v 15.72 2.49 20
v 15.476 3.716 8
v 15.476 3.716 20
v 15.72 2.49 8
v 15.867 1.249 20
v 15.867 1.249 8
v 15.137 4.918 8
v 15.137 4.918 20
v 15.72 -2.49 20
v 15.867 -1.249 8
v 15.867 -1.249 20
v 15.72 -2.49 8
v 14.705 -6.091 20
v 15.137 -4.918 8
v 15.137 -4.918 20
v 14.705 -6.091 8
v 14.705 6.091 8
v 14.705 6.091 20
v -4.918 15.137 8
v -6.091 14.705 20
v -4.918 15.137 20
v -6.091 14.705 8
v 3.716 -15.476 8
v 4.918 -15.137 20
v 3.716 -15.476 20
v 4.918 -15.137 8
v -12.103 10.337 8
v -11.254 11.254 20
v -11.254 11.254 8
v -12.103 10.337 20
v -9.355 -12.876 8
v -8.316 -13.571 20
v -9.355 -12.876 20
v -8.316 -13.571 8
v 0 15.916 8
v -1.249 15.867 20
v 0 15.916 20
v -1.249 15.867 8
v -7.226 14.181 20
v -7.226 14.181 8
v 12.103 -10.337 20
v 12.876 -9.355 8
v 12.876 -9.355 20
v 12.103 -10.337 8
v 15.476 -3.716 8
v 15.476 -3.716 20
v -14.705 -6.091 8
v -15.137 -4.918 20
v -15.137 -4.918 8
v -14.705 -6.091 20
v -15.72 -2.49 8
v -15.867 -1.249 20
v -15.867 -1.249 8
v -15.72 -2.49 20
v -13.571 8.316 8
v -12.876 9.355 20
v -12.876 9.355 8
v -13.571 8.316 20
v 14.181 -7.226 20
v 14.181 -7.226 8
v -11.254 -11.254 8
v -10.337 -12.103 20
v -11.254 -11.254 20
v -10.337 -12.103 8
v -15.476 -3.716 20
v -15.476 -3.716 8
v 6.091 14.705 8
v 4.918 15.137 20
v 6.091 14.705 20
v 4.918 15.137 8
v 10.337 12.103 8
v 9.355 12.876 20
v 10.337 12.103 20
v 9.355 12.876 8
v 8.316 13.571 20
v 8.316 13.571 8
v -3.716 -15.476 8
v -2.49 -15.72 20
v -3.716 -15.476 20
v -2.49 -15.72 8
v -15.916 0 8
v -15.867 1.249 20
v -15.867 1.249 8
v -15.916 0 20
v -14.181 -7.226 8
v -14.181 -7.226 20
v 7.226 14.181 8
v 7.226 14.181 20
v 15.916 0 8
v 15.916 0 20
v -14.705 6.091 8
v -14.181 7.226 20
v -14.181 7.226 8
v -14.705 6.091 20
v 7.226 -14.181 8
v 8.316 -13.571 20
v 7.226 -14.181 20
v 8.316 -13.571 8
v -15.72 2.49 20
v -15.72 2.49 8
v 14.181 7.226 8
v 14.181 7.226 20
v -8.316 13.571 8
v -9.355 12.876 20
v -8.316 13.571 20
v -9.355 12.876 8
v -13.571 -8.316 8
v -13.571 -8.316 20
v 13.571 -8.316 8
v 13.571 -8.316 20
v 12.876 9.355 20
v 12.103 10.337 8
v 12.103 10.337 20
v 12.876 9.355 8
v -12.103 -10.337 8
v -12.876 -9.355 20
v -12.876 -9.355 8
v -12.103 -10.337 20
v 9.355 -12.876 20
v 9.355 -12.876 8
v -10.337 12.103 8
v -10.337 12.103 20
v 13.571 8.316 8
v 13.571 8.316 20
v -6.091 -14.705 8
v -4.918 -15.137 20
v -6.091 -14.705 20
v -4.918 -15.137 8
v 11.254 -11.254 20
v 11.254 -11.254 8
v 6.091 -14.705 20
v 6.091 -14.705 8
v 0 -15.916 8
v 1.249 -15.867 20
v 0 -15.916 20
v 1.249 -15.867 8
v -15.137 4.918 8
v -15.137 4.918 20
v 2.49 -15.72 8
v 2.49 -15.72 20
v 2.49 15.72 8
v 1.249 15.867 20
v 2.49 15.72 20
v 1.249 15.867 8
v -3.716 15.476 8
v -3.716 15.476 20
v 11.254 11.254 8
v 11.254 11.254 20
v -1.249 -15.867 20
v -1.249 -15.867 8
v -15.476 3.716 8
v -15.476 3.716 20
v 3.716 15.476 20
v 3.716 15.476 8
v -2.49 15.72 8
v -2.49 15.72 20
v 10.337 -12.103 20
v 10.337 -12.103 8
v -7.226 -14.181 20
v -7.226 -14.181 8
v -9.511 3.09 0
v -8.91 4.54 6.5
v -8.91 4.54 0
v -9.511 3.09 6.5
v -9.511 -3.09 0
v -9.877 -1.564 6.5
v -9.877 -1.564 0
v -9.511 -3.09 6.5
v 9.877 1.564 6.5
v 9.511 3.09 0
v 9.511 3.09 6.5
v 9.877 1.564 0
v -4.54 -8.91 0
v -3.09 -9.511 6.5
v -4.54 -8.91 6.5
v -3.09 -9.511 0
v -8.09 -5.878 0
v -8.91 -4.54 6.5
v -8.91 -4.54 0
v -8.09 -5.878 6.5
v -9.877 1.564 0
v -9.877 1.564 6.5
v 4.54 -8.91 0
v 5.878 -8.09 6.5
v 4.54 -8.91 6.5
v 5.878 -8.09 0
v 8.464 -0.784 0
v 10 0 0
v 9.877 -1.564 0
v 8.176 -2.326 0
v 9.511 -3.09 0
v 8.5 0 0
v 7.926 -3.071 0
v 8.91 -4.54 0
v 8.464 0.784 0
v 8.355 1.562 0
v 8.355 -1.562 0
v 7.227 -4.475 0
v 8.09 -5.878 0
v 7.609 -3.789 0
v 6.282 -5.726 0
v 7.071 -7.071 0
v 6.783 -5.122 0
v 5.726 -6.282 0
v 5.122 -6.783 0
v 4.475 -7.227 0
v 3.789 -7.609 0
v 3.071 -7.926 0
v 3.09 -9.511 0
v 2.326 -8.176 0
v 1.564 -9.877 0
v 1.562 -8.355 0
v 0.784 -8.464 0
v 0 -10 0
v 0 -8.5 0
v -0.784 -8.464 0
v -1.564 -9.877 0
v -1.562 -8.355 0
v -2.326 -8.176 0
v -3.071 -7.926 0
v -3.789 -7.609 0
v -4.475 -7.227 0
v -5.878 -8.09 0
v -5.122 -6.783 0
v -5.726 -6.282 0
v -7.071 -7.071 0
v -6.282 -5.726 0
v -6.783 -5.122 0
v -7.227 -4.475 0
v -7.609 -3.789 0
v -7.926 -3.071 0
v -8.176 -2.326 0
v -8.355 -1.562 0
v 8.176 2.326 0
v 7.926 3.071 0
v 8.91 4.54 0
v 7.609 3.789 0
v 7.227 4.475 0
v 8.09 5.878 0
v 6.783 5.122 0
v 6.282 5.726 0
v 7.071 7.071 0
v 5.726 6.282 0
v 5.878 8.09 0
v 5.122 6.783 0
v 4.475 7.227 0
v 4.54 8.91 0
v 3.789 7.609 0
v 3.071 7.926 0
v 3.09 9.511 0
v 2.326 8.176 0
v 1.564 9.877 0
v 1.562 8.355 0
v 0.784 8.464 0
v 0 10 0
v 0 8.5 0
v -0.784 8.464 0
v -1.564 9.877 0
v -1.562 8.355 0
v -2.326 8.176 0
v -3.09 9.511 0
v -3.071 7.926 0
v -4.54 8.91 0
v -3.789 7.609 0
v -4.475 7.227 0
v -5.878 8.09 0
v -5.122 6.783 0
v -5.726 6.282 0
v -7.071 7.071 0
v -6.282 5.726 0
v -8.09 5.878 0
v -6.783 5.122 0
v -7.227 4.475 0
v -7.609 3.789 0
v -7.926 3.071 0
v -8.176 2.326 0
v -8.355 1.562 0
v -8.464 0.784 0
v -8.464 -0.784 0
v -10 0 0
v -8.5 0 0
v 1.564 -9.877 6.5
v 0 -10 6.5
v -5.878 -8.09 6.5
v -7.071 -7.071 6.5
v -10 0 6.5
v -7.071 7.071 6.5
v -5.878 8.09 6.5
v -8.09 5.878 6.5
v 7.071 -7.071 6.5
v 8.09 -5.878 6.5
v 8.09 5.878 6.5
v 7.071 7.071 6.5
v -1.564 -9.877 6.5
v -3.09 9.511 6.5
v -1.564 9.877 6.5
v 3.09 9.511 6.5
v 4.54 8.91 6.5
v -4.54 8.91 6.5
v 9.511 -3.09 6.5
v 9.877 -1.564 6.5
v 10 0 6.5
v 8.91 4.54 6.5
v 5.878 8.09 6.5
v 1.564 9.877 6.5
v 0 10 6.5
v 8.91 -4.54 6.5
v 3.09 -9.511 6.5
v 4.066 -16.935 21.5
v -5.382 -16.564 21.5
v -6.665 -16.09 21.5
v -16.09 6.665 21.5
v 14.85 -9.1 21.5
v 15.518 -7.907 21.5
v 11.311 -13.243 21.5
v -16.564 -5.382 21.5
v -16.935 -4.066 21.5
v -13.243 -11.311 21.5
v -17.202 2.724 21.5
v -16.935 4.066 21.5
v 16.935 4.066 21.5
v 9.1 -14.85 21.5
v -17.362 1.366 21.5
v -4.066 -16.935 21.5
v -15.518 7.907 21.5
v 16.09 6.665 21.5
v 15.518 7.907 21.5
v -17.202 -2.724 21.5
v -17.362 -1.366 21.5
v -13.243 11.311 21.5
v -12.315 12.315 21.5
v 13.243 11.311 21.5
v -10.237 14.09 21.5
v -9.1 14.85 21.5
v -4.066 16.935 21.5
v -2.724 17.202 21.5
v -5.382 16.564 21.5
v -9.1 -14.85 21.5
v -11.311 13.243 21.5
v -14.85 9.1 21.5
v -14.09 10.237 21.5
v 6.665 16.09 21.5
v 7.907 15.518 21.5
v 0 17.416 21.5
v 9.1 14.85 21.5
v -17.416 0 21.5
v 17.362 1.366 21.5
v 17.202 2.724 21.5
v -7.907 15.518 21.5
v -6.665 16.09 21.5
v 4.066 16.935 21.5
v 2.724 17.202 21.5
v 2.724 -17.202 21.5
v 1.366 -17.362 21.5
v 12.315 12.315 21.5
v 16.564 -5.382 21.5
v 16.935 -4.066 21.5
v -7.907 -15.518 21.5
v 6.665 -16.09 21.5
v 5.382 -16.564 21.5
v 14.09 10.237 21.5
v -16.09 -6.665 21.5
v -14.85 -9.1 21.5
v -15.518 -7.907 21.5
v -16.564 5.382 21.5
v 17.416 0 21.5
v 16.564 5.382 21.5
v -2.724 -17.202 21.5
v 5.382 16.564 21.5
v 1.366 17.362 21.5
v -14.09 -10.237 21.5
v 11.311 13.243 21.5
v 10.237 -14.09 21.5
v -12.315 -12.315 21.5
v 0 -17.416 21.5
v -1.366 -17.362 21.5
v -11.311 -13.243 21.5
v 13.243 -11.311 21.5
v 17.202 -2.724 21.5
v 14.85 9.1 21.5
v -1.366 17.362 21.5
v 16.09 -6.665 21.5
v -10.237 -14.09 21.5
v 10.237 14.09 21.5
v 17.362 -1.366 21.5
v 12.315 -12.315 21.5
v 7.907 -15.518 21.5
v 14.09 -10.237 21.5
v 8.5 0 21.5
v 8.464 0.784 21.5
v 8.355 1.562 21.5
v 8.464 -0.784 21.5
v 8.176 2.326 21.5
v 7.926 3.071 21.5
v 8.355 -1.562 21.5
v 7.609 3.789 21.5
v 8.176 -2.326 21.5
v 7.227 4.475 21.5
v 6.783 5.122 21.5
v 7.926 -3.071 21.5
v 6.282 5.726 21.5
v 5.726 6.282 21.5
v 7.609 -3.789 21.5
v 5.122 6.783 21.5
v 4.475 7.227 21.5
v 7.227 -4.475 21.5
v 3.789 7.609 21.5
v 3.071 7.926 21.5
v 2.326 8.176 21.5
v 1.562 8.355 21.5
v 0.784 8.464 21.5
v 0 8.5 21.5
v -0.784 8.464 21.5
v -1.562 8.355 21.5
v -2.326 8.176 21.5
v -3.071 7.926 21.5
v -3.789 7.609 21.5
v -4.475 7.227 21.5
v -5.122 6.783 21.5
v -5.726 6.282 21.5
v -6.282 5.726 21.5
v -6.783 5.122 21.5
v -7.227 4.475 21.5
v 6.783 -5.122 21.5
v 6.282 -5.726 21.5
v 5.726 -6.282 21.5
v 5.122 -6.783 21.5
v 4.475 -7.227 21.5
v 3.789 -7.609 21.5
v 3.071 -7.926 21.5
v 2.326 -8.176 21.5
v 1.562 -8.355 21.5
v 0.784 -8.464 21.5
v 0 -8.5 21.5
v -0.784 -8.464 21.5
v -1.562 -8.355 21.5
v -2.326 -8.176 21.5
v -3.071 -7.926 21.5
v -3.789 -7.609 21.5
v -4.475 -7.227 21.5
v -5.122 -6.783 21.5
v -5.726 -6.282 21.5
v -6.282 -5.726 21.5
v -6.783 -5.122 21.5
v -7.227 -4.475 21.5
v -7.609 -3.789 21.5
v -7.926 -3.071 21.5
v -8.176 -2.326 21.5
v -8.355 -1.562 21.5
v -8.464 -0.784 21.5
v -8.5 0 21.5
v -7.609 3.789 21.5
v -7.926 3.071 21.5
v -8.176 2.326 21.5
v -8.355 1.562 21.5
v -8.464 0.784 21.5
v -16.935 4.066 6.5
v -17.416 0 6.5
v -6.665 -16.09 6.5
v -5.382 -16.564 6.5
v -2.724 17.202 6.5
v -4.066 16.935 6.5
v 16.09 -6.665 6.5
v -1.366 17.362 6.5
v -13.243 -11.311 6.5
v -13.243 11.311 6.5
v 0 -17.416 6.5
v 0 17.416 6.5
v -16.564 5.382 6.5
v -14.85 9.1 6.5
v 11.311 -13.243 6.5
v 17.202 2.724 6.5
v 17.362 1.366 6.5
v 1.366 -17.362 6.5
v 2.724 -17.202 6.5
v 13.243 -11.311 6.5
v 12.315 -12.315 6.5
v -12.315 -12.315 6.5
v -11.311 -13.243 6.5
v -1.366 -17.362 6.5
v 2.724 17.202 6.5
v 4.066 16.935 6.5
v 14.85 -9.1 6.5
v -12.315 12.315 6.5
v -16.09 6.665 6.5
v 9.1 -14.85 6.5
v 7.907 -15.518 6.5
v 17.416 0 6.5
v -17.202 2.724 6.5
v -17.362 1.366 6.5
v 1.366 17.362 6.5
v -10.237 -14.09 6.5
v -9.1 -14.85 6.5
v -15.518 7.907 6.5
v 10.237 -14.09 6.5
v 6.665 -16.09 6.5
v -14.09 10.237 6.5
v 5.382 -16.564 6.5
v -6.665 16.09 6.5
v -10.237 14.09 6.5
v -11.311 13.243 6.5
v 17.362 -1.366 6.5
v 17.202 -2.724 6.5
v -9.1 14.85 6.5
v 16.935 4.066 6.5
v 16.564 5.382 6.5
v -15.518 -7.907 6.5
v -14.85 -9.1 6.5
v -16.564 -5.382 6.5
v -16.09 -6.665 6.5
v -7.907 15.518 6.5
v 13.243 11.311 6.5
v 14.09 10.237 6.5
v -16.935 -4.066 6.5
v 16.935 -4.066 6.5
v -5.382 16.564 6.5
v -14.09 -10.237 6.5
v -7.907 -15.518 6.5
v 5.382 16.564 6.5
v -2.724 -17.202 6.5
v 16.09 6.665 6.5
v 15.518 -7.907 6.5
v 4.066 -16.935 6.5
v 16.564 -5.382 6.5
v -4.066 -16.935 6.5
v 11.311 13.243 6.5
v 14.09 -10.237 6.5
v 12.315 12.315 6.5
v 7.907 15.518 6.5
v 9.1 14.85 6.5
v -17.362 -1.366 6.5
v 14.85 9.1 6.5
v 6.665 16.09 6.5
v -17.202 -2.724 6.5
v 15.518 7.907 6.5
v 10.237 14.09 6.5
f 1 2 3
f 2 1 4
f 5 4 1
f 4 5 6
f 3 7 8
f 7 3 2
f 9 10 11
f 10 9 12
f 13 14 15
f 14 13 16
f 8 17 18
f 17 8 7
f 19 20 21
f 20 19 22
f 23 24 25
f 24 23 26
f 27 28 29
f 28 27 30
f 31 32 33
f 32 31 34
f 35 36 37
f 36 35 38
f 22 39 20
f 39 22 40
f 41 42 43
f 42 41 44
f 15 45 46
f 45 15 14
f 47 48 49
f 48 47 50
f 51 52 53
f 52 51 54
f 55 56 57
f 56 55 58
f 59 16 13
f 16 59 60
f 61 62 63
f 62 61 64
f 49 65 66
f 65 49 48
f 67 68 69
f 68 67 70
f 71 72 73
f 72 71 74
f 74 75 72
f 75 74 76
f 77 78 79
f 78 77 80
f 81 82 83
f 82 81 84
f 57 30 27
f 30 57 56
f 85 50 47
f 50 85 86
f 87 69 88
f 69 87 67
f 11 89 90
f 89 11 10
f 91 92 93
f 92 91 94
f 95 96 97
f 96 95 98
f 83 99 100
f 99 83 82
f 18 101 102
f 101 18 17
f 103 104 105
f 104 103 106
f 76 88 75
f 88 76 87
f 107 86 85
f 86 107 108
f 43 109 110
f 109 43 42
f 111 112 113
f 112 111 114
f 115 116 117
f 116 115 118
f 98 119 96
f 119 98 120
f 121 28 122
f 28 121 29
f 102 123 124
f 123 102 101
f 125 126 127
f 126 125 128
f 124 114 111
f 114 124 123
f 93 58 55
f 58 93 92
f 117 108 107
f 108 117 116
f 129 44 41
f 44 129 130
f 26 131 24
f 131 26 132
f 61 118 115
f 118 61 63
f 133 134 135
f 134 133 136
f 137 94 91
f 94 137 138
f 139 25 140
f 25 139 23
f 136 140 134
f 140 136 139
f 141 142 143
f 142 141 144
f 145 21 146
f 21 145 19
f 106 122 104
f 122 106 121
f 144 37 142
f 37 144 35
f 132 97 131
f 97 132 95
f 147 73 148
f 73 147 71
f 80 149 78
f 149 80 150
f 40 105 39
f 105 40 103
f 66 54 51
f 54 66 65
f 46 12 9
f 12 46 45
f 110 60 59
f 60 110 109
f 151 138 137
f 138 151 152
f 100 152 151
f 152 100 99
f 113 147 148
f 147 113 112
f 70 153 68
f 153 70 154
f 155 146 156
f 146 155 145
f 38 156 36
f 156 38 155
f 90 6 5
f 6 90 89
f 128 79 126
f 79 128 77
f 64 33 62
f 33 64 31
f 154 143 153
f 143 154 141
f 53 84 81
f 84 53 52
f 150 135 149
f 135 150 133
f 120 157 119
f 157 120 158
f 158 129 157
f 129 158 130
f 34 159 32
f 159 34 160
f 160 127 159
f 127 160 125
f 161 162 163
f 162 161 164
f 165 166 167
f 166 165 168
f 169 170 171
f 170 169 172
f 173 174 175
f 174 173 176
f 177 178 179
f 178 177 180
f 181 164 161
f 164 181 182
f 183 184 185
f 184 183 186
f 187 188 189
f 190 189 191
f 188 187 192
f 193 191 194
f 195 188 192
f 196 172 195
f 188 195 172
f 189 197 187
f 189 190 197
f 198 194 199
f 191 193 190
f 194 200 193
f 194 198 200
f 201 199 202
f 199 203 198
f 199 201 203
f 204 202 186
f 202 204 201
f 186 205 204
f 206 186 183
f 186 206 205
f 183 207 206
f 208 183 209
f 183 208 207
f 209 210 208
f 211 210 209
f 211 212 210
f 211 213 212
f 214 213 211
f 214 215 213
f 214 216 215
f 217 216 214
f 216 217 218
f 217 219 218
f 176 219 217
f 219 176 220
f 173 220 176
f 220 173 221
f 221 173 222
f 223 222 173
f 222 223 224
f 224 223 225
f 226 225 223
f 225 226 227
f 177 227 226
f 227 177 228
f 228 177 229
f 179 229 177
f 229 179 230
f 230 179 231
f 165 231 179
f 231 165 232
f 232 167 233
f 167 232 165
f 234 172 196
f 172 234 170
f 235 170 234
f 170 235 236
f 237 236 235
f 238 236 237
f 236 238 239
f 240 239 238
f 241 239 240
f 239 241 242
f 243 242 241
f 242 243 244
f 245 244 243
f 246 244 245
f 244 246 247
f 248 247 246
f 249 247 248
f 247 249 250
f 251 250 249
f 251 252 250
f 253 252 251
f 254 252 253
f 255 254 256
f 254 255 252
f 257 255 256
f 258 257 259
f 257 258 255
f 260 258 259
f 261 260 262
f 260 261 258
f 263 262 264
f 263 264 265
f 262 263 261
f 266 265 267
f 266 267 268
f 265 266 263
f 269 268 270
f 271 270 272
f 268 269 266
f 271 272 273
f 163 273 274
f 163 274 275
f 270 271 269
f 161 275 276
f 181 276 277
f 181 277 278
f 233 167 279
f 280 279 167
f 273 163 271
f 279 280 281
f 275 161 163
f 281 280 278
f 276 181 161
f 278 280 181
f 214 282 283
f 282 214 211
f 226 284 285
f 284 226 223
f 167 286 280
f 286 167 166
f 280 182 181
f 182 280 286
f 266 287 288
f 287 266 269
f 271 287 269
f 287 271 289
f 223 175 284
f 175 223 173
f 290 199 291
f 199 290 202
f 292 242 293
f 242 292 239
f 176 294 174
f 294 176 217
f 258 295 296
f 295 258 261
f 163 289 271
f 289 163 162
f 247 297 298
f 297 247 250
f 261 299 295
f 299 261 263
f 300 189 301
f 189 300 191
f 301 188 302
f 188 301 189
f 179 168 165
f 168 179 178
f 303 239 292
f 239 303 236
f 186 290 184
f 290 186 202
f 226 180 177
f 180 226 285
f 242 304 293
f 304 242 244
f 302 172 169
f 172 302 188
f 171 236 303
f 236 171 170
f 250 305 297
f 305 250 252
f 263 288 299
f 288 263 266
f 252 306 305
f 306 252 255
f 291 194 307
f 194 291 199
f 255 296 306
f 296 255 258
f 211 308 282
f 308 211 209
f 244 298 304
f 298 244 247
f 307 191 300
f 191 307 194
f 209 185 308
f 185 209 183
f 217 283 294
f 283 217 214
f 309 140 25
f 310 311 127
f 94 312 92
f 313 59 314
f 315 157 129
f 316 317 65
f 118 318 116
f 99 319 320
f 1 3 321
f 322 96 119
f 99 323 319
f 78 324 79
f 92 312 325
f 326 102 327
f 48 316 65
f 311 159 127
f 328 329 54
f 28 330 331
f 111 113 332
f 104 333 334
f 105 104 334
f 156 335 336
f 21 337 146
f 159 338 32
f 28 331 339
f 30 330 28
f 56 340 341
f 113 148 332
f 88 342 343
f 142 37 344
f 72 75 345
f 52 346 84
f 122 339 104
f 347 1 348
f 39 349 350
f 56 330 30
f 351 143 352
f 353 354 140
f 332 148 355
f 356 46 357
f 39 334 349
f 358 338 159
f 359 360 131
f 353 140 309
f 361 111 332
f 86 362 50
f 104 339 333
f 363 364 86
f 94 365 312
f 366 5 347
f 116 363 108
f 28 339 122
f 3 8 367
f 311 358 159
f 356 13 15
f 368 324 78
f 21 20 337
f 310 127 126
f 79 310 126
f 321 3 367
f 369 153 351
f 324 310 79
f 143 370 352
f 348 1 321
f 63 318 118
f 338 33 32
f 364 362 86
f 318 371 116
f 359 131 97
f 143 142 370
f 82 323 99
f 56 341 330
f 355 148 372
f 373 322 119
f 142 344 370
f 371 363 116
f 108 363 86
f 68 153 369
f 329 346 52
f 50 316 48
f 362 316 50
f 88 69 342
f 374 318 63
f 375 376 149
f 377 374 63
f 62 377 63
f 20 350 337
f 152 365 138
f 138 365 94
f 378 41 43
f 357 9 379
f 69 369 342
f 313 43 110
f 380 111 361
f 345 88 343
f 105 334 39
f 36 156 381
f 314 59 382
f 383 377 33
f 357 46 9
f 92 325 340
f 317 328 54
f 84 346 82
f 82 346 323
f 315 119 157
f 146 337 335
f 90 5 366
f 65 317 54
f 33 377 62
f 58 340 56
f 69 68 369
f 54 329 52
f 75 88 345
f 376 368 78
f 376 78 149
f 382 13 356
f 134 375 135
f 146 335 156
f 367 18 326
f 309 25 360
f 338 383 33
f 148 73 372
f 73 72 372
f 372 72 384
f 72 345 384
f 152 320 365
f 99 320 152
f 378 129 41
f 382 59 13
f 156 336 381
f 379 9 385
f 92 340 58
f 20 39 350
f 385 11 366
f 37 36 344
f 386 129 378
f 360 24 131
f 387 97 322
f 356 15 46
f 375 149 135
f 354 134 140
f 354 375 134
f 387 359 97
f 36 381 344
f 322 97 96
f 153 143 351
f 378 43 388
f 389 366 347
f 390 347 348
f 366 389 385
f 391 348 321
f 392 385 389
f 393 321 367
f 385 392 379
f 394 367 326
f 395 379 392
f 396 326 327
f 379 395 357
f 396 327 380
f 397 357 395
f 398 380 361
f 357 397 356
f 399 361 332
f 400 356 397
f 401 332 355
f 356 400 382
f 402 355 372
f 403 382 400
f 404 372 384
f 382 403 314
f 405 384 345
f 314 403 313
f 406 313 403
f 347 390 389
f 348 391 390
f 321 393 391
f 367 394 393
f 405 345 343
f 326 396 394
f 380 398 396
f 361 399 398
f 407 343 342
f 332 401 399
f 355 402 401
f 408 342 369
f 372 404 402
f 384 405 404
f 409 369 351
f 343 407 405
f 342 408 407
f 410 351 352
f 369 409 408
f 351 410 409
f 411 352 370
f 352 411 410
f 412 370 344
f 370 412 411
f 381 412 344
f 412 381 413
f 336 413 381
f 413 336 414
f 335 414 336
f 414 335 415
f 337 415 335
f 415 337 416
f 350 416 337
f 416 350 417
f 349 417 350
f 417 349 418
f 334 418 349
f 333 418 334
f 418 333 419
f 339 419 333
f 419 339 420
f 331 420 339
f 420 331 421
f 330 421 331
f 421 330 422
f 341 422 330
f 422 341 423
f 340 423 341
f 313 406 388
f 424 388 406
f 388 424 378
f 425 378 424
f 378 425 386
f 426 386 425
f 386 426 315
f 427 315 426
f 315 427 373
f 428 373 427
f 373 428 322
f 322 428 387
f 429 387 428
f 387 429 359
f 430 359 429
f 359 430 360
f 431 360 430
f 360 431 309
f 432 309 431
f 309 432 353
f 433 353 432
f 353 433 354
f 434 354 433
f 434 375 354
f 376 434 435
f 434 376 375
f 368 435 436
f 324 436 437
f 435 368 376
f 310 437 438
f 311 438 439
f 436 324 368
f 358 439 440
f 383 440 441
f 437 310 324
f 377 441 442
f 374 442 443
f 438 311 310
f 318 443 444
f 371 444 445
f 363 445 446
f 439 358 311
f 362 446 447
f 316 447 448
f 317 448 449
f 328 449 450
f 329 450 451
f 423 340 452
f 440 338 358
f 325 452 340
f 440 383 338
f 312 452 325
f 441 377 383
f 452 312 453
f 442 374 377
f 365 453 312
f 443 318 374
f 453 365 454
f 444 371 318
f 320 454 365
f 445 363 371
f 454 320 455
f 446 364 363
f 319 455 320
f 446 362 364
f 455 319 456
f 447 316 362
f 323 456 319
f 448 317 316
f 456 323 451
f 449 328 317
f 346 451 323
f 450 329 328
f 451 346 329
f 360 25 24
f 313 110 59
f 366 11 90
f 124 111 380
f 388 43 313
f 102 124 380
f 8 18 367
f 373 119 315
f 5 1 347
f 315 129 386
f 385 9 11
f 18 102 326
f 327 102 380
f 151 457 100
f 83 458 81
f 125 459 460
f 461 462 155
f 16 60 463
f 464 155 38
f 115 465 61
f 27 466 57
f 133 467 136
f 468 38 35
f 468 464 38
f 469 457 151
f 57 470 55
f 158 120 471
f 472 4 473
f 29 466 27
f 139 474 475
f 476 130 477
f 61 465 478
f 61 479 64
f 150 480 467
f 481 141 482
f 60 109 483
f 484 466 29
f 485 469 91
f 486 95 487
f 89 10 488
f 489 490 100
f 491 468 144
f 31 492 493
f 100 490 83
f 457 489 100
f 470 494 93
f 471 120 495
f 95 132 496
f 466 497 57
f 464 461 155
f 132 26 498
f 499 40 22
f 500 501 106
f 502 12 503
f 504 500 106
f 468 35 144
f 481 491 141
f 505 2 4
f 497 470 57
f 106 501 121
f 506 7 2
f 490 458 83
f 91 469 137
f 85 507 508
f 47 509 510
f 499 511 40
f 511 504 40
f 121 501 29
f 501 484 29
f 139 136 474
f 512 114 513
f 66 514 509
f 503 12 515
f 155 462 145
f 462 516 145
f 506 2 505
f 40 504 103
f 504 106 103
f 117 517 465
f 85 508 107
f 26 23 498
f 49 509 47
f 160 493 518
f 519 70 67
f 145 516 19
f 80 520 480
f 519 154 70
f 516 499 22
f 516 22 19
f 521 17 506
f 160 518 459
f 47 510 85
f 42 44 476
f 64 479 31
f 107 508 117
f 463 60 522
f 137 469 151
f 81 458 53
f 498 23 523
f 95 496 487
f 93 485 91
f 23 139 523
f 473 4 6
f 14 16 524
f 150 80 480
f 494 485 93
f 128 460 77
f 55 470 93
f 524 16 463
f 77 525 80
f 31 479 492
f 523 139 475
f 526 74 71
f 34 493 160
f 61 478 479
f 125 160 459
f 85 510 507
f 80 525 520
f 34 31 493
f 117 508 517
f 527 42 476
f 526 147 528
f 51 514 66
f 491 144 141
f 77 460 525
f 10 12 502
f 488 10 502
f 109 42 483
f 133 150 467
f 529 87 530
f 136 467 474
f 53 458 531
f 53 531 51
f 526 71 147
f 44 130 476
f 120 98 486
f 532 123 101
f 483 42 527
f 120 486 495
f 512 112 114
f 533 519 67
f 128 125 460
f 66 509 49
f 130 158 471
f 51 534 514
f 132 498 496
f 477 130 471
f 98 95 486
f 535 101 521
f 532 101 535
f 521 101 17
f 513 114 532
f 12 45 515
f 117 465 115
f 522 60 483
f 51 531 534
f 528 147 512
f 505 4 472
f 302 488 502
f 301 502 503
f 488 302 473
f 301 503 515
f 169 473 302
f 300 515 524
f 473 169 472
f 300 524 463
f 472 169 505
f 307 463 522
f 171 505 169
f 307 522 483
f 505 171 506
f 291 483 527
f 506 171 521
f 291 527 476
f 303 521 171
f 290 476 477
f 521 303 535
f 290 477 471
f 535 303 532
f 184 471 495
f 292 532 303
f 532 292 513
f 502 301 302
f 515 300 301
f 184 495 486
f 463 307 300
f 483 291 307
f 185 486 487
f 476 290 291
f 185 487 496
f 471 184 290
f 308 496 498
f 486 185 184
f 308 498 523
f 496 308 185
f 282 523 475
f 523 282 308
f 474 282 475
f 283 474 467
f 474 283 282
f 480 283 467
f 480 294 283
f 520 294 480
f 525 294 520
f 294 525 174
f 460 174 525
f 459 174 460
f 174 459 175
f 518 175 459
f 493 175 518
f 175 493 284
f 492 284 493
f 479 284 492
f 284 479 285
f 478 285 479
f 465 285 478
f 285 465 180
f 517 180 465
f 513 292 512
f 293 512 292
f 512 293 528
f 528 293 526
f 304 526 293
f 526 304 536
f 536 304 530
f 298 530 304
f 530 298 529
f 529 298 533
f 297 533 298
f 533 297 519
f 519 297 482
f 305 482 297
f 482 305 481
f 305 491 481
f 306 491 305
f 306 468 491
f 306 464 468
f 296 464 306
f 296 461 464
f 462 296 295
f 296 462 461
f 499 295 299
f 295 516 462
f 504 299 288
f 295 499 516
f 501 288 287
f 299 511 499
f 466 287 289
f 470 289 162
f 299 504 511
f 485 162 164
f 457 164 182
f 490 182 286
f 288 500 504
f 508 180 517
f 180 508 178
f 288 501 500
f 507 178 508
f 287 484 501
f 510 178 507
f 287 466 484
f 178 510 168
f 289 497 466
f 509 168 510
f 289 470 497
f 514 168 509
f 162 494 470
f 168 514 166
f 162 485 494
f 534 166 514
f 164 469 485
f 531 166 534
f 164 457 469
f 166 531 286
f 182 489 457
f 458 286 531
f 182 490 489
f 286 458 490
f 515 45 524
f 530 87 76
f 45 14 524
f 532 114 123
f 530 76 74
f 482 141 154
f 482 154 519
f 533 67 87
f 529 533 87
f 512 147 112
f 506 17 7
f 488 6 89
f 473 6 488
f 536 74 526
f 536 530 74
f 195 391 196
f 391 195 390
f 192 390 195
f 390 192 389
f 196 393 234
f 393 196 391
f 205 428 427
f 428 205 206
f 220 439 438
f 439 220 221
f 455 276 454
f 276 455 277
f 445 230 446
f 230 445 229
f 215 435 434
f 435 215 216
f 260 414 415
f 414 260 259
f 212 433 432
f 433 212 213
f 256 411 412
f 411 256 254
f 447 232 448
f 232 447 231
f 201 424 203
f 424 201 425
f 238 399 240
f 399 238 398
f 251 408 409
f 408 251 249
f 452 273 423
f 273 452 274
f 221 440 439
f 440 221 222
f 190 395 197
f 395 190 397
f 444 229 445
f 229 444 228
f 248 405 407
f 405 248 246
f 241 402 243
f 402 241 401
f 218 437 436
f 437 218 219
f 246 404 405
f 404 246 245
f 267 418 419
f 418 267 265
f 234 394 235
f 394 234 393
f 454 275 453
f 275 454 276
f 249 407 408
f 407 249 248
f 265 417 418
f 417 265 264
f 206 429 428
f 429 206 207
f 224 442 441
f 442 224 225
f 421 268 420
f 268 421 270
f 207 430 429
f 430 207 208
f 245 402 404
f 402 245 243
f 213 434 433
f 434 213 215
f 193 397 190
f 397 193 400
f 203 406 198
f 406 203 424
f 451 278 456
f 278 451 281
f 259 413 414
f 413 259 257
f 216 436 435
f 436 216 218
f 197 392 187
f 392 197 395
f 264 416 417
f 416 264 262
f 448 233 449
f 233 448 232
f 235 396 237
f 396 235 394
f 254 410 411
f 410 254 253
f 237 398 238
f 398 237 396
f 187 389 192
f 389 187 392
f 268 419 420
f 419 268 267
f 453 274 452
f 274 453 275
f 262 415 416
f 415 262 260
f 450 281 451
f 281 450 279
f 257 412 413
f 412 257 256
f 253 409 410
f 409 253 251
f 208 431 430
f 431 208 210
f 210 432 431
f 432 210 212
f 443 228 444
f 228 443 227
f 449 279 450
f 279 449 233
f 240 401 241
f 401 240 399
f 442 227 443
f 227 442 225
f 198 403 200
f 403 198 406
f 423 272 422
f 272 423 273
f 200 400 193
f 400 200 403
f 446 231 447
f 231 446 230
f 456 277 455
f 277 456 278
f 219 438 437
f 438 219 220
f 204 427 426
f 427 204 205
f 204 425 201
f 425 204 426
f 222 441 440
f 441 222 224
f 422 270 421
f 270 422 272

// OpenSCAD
include<Pulley_T-MXL-XL-HTD-GT2_N-tooth.scad>;

teeth = 20;			// Number of teeth, standard Mendel T5 belt = 8, gives Outside Diameter of 11.88mm
profile = 3;		// 1=MXL 2=40DP 3=XL 4=H 5=T2.5 6=T5 7=T10 8=AT5 9=HTD_3mm 10=HTD_5mm 11=HTD_8mm 12=GT2_2mm 13=GT2_3mm 14=GT2_5mm
retainer = 1;
idler = 1;
motor_shaft = 17;	// NEMA17 motor shaft exact diameter = 5
m3_dia = 3.2;		// 3mm hole diameter
m3_nut_hex = 1;		// 1 for hex, 0 for square nut
m3_nut_flats = 5.7;	// normal M3 hex nut exact width = 5.5
m3_nut_depth = 2.7;	// normal M3 hex nut exact depth = 2.4, nyloc = 4
